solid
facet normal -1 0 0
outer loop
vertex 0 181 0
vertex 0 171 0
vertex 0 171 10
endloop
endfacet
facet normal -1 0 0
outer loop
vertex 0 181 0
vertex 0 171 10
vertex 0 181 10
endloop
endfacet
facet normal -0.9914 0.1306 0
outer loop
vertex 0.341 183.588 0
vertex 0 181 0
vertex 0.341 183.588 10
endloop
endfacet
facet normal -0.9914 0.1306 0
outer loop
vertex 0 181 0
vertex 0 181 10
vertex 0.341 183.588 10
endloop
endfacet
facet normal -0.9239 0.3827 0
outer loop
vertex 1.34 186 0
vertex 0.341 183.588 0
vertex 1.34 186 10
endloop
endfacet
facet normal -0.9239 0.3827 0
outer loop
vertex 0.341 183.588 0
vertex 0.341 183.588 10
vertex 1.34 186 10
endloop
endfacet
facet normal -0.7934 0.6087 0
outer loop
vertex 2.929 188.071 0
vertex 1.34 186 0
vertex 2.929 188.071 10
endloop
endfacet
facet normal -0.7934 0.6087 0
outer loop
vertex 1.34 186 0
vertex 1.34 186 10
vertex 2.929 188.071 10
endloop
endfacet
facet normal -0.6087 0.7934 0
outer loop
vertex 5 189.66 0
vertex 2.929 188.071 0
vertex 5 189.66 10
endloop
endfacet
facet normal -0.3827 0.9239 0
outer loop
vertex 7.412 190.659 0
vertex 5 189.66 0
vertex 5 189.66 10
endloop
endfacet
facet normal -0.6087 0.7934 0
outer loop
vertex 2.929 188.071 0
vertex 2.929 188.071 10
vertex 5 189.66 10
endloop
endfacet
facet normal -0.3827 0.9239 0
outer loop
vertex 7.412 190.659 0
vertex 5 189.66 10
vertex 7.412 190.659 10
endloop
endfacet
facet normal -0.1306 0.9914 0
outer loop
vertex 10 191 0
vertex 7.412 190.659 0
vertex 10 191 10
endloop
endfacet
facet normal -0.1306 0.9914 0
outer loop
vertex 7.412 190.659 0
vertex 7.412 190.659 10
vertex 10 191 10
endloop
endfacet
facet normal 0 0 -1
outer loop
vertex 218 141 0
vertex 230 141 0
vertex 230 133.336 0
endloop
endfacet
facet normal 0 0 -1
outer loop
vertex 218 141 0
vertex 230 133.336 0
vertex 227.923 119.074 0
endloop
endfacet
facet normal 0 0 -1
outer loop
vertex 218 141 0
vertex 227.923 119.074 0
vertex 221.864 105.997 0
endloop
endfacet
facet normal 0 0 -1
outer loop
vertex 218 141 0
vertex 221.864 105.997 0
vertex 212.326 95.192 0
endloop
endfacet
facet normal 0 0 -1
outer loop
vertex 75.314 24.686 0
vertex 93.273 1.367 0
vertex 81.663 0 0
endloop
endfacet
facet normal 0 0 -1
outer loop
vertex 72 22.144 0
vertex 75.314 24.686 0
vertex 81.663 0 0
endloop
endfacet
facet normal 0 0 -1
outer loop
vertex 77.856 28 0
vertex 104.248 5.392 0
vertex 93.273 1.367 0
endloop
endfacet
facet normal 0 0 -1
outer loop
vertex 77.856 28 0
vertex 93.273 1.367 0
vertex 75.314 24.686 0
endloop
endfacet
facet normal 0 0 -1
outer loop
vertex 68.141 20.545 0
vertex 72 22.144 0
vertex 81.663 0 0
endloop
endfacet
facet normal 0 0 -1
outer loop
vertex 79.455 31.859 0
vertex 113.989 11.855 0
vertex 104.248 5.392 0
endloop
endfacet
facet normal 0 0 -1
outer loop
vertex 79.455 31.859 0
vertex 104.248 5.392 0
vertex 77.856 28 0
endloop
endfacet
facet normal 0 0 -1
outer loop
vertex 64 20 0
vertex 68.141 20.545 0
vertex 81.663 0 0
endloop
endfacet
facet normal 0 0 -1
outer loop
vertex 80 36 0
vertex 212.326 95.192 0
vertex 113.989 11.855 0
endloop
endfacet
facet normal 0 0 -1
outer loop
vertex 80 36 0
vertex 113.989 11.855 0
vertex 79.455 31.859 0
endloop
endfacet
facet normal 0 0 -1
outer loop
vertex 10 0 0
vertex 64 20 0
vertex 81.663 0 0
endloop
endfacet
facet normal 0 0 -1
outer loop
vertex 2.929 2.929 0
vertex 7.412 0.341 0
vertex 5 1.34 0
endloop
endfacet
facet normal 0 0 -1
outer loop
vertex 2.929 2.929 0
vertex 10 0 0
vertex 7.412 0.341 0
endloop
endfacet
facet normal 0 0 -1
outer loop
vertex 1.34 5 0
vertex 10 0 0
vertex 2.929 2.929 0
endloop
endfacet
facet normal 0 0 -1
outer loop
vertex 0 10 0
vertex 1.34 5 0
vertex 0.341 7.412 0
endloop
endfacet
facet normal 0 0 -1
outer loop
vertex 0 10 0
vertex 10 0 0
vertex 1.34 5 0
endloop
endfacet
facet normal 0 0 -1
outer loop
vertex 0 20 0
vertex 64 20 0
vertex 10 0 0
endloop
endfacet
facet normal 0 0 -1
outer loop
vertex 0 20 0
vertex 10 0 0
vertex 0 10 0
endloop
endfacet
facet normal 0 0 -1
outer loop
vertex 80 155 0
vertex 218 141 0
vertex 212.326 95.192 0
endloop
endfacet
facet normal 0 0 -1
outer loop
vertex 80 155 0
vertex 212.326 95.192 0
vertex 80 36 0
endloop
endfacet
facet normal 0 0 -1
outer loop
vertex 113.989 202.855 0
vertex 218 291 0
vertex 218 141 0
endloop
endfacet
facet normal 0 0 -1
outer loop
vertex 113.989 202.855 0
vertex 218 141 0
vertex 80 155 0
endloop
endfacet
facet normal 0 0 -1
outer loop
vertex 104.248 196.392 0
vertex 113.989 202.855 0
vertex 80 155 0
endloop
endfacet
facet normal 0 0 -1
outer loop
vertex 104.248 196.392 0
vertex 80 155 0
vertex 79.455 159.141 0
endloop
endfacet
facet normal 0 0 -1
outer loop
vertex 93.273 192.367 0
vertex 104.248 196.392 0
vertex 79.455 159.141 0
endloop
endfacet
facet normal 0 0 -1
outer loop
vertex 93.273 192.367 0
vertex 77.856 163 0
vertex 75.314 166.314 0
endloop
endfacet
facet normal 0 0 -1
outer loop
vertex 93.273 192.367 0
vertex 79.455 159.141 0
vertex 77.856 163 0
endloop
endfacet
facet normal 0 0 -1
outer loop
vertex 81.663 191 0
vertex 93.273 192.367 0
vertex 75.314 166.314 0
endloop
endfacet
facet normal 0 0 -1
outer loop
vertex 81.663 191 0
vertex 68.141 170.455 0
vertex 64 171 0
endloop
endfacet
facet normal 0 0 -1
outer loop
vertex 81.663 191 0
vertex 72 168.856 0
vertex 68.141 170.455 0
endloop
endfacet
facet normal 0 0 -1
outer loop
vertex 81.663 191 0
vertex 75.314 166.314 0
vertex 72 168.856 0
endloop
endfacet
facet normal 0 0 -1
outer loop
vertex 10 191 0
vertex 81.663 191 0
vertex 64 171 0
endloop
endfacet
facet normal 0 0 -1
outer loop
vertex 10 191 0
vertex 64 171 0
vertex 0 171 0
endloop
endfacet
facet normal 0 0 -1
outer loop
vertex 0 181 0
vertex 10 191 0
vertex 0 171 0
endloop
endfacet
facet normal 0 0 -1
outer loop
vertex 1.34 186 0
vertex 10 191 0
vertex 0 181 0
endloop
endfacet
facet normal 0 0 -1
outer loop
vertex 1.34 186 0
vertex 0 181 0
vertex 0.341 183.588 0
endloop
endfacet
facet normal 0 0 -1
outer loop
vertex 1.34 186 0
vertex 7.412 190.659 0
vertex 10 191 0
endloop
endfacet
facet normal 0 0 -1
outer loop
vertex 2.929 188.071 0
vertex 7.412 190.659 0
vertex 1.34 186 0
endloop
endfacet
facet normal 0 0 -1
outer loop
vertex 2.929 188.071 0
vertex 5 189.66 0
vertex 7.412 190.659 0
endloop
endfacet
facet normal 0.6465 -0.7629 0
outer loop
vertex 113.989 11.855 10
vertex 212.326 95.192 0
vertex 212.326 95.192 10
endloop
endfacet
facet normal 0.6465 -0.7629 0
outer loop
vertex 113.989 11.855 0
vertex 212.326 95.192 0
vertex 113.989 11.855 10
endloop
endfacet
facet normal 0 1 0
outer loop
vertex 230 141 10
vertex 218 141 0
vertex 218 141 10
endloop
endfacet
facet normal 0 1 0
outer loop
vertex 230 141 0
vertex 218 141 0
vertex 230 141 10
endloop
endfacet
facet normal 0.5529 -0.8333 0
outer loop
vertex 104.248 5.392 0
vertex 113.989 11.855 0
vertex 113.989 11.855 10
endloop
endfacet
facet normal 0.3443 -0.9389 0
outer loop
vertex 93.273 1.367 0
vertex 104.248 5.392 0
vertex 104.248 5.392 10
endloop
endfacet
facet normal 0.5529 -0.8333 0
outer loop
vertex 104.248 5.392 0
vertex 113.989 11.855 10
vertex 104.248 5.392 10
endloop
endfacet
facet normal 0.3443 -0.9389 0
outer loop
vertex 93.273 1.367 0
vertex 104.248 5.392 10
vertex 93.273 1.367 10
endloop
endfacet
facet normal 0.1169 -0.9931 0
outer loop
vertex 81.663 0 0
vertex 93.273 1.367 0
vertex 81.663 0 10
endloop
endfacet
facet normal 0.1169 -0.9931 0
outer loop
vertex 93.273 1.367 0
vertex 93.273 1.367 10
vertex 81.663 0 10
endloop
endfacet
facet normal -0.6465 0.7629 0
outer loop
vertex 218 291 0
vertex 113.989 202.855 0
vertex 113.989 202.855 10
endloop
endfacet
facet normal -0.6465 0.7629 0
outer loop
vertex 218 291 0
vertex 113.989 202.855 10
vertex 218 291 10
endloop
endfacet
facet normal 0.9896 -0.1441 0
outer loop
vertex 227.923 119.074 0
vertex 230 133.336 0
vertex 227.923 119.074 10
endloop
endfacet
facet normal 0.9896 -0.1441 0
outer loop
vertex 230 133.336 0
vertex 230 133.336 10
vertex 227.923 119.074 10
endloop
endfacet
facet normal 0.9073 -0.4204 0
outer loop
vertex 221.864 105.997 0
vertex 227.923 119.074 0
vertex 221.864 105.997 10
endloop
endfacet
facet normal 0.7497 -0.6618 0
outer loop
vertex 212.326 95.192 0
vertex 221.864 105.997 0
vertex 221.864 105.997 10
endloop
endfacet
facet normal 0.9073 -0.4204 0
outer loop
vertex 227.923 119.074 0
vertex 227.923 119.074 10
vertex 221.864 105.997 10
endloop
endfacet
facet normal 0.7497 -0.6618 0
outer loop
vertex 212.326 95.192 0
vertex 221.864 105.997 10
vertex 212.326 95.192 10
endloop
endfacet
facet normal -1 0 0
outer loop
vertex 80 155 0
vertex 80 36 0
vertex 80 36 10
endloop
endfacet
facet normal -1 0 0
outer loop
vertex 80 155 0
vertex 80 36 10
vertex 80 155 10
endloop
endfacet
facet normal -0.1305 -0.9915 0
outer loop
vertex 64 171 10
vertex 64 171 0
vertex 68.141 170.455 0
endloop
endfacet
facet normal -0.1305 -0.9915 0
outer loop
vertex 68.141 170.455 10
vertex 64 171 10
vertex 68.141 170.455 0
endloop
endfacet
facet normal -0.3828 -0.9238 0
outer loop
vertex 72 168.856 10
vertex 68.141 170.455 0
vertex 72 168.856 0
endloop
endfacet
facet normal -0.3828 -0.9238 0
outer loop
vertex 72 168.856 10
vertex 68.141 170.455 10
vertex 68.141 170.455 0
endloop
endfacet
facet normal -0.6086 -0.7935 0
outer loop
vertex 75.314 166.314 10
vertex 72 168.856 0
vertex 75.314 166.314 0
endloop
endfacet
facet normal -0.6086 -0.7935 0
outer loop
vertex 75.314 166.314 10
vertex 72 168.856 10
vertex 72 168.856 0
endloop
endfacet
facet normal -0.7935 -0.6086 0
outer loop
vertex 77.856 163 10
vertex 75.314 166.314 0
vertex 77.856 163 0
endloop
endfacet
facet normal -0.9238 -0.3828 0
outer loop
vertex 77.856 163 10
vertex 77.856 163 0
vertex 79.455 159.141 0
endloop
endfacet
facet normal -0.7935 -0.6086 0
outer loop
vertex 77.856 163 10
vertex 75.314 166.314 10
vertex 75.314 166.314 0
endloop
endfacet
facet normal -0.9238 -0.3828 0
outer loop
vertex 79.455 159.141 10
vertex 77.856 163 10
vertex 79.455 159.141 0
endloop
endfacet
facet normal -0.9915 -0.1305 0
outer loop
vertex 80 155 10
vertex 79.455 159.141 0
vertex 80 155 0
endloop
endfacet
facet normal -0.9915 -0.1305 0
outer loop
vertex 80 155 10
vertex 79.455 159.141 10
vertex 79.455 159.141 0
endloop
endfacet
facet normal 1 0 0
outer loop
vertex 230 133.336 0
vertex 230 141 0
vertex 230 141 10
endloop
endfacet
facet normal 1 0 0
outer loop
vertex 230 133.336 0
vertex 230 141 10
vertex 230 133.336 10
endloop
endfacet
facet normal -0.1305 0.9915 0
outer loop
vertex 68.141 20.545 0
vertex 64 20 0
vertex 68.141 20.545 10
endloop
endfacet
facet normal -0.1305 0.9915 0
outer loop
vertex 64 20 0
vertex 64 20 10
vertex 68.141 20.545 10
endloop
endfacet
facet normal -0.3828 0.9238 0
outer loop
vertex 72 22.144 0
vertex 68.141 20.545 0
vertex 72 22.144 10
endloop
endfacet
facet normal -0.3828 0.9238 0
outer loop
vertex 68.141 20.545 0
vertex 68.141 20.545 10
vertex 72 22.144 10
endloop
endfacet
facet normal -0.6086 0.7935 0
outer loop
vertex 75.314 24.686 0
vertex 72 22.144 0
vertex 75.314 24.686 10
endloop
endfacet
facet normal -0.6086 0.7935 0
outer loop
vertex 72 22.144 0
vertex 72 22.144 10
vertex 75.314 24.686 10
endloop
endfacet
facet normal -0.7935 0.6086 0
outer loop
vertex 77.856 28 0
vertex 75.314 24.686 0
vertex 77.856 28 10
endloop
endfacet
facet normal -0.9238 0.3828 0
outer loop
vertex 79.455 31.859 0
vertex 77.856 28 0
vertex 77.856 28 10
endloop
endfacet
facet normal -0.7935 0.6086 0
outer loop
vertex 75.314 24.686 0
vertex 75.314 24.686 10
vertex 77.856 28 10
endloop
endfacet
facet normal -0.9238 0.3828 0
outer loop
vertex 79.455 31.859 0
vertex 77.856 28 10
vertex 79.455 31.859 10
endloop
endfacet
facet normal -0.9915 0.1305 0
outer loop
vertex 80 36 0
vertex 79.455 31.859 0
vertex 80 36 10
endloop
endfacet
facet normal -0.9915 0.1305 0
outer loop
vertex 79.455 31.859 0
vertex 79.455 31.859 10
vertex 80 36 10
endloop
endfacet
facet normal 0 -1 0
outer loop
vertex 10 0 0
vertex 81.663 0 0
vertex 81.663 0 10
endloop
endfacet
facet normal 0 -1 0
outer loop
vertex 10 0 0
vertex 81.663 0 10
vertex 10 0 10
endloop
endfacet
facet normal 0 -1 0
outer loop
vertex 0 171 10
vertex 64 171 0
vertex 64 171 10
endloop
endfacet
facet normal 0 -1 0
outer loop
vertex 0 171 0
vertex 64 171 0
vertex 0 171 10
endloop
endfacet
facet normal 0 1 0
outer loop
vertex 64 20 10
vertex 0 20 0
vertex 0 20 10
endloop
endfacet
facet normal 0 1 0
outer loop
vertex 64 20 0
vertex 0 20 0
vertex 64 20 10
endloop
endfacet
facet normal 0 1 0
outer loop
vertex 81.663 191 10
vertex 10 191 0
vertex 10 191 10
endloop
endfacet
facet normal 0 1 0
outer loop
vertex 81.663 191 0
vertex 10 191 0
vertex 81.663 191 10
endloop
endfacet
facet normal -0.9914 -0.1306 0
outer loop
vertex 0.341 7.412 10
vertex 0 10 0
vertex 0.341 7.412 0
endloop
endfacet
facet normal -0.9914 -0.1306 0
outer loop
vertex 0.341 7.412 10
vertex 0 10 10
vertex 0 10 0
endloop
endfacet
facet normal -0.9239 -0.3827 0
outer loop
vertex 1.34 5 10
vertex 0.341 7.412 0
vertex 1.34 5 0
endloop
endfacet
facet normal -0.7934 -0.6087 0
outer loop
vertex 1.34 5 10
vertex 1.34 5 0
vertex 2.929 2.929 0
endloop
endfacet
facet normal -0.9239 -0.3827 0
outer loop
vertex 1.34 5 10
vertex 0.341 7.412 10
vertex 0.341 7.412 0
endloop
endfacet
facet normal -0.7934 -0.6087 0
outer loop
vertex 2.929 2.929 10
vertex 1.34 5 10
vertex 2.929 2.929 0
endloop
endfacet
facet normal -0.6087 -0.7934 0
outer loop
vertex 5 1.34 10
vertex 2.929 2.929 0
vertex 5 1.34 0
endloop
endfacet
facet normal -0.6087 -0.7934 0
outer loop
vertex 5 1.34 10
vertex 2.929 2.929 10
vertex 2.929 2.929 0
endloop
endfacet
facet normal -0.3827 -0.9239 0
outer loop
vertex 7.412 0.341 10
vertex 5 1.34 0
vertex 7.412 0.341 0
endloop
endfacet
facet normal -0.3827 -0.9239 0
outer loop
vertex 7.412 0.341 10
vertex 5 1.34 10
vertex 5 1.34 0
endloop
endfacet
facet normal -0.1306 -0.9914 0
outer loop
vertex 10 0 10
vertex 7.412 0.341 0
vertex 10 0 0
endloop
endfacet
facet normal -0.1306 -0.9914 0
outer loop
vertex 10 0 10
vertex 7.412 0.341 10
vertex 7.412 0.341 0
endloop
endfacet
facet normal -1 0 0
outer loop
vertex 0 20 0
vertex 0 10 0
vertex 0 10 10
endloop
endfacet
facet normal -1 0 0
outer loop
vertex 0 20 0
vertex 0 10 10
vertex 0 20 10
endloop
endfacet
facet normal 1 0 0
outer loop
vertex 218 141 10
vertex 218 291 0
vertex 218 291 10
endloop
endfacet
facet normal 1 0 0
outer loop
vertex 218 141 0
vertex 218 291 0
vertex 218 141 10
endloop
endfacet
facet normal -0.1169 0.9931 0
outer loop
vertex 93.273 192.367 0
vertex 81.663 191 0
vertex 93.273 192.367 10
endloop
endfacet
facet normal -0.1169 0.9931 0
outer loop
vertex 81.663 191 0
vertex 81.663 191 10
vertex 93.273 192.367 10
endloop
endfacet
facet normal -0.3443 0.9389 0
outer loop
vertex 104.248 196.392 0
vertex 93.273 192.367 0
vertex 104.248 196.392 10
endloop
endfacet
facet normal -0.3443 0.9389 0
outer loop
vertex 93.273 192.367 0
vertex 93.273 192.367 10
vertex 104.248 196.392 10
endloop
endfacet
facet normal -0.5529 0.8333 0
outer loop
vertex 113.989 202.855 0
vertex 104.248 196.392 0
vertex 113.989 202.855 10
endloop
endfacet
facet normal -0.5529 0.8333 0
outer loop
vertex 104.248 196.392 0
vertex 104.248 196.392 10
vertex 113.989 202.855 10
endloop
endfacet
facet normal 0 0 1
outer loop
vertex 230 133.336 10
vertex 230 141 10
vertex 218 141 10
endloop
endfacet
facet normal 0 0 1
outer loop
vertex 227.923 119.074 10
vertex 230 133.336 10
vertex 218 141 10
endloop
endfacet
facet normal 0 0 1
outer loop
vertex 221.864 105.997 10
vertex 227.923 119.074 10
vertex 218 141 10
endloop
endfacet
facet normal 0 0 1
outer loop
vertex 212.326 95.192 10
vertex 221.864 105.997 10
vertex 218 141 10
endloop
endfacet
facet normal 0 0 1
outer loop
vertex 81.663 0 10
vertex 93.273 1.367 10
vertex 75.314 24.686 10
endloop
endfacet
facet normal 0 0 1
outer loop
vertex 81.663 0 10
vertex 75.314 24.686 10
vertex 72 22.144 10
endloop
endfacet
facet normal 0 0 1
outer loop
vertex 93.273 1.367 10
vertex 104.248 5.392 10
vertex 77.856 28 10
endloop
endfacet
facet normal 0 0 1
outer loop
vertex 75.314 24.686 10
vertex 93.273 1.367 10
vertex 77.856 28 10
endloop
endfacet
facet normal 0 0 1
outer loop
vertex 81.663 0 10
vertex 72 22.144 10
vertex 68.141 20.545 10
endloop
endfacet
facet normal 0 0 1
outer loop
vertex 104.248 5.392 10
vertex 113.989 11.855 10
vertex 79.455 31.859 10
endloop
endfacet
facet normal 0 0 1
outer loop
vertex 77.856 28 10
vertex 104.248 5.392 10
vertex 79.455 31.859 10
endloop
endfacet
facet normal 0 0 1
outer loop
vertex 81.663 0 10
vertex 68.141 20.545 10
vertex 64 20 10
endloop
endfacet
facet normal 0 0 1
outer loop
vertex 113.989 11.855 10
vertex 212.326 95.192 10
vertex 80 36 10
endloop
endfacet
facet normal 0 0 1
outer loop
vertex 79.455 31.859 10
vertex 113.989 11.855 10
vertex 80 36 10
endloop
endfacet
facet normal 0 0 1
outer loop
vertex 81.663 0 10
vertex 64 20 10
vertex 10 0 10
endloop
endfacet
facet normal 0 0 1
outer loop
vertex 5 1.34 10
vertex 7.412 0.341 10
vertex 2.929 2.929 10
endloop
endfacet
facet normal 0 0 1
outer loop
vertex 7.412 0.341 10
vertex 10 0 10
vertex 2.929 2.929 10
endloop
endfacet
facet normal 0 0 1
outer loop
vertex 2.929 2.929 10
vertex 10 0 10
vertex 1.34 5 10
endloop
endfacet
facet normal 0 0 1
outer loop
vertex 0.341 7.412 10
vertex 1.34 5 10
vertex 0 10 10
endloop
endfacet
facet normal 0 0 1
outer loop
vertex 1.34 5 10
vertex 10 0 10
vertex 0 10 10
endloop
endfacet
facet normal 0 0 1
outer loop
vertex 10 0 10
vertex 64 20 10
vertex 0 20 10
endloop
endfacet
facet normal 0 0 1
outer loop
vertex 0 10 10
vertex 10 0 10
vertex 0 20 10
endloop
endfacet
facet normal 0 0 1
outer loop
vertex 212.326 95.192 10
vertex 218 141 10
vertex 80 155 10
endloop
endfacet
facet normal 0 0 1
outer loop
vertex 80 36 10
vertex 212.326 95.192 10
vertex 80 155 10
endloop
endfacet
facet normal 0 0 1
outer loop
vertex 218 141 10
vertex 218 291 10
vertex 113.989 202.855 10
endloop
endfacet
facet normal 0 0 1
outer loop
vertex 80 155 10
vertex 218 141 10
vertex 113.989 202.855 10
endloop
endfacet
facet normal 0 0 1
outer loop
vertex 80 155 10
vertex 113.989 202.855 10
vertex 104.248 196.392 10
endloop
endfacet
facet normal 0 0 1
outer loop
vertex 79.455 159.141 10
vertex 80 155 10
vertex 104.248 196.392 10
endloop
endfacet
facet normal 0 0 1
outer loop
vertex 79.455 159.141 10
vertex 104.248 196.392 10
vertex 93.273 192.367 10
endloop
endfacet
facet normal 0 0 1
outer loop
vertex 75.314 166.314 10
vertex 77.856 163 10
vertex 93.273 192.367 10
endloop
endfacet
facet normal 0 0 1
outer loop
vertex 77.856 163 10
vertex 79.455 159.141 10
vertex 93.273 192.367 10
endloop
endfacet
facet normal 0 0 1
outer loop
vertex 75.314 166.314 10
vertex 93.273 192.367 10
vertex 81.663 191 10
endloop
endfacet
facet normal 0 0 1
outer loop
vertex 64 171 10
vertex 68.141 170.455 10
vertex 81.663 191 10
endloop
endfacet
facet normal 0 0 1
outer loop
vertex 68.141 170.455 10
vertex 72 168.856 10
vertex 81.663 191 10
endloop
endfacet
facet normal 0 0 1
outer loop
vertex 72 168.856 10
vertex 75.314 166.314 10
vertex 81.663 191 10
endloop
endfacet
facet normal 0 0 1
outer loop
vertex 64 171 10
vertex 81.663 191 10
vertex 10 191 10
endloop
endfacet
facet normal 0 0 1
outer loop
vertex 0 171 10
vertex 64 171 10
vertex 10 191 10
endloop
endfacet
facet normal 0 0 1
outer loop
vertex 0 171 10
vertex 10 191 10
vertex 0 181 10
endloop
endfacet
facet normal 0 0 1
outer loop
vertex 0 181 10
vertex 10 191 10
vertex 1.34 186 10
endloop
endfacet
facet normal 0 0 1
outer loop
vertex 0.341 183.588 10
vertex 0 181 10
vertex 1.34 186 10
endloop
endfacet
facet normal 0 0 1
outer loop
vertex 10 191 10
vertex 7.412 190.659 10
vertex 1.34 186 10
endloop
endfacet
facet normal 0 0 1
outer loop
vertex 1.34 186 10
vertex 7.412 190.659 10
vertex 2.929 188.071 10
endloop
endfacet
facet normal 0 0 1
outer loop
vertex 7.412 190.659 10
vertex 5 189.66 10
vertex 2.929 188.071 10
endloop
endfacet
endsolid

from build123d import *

# Parameters (mm, degrees)
BOSS_EXTRU_1_DEPTH = 10
CONG_2_R           = 16
CONG_3_R           = 10
CONG_4_R           = 50


with BuildPart() as part:
    # Esquisse1 → Boss.-Extru.1 (new body)
    with BuildSketch(Plane.XY):
        Polygon((80, 171), (0, 171), (0, 191), (100, 191), (218, 291), (218, 141), (230, 141), (230, 110.169491525), (100, 0), (0, 0), (0, 20), (80, 20), align=None)
    extrude(amount=BOSS_EXTRU_1_DEPTH)

    # Congé2
    cong_2_edges = [part.edges().sort_by_distance(p)[0] for p in [
        (80, 20, 5),
        (80, 171, 5),
    ]]
    fillet(cong_2_edges, radius=CONG_2_R)

    # Congé3
    cong_3_edges = [part.edges().sort_by_distance(p)[0] for p in [
        (0, 191, 5),
        (0, 0, 5),
    ]]
    fillet(cong_3_edges, radius=CONG_3_R)

    # Congé4
    cong_4_edges = [part.edges().sort_by_distance(p)[0] for p in [
        (100, 191, 5),
        (230, 110.169491525, 5),
        (100, 0, 5),
    ]]
    fillet(cong_4_edges, radius=CONG_4_R)


solid = part.part
